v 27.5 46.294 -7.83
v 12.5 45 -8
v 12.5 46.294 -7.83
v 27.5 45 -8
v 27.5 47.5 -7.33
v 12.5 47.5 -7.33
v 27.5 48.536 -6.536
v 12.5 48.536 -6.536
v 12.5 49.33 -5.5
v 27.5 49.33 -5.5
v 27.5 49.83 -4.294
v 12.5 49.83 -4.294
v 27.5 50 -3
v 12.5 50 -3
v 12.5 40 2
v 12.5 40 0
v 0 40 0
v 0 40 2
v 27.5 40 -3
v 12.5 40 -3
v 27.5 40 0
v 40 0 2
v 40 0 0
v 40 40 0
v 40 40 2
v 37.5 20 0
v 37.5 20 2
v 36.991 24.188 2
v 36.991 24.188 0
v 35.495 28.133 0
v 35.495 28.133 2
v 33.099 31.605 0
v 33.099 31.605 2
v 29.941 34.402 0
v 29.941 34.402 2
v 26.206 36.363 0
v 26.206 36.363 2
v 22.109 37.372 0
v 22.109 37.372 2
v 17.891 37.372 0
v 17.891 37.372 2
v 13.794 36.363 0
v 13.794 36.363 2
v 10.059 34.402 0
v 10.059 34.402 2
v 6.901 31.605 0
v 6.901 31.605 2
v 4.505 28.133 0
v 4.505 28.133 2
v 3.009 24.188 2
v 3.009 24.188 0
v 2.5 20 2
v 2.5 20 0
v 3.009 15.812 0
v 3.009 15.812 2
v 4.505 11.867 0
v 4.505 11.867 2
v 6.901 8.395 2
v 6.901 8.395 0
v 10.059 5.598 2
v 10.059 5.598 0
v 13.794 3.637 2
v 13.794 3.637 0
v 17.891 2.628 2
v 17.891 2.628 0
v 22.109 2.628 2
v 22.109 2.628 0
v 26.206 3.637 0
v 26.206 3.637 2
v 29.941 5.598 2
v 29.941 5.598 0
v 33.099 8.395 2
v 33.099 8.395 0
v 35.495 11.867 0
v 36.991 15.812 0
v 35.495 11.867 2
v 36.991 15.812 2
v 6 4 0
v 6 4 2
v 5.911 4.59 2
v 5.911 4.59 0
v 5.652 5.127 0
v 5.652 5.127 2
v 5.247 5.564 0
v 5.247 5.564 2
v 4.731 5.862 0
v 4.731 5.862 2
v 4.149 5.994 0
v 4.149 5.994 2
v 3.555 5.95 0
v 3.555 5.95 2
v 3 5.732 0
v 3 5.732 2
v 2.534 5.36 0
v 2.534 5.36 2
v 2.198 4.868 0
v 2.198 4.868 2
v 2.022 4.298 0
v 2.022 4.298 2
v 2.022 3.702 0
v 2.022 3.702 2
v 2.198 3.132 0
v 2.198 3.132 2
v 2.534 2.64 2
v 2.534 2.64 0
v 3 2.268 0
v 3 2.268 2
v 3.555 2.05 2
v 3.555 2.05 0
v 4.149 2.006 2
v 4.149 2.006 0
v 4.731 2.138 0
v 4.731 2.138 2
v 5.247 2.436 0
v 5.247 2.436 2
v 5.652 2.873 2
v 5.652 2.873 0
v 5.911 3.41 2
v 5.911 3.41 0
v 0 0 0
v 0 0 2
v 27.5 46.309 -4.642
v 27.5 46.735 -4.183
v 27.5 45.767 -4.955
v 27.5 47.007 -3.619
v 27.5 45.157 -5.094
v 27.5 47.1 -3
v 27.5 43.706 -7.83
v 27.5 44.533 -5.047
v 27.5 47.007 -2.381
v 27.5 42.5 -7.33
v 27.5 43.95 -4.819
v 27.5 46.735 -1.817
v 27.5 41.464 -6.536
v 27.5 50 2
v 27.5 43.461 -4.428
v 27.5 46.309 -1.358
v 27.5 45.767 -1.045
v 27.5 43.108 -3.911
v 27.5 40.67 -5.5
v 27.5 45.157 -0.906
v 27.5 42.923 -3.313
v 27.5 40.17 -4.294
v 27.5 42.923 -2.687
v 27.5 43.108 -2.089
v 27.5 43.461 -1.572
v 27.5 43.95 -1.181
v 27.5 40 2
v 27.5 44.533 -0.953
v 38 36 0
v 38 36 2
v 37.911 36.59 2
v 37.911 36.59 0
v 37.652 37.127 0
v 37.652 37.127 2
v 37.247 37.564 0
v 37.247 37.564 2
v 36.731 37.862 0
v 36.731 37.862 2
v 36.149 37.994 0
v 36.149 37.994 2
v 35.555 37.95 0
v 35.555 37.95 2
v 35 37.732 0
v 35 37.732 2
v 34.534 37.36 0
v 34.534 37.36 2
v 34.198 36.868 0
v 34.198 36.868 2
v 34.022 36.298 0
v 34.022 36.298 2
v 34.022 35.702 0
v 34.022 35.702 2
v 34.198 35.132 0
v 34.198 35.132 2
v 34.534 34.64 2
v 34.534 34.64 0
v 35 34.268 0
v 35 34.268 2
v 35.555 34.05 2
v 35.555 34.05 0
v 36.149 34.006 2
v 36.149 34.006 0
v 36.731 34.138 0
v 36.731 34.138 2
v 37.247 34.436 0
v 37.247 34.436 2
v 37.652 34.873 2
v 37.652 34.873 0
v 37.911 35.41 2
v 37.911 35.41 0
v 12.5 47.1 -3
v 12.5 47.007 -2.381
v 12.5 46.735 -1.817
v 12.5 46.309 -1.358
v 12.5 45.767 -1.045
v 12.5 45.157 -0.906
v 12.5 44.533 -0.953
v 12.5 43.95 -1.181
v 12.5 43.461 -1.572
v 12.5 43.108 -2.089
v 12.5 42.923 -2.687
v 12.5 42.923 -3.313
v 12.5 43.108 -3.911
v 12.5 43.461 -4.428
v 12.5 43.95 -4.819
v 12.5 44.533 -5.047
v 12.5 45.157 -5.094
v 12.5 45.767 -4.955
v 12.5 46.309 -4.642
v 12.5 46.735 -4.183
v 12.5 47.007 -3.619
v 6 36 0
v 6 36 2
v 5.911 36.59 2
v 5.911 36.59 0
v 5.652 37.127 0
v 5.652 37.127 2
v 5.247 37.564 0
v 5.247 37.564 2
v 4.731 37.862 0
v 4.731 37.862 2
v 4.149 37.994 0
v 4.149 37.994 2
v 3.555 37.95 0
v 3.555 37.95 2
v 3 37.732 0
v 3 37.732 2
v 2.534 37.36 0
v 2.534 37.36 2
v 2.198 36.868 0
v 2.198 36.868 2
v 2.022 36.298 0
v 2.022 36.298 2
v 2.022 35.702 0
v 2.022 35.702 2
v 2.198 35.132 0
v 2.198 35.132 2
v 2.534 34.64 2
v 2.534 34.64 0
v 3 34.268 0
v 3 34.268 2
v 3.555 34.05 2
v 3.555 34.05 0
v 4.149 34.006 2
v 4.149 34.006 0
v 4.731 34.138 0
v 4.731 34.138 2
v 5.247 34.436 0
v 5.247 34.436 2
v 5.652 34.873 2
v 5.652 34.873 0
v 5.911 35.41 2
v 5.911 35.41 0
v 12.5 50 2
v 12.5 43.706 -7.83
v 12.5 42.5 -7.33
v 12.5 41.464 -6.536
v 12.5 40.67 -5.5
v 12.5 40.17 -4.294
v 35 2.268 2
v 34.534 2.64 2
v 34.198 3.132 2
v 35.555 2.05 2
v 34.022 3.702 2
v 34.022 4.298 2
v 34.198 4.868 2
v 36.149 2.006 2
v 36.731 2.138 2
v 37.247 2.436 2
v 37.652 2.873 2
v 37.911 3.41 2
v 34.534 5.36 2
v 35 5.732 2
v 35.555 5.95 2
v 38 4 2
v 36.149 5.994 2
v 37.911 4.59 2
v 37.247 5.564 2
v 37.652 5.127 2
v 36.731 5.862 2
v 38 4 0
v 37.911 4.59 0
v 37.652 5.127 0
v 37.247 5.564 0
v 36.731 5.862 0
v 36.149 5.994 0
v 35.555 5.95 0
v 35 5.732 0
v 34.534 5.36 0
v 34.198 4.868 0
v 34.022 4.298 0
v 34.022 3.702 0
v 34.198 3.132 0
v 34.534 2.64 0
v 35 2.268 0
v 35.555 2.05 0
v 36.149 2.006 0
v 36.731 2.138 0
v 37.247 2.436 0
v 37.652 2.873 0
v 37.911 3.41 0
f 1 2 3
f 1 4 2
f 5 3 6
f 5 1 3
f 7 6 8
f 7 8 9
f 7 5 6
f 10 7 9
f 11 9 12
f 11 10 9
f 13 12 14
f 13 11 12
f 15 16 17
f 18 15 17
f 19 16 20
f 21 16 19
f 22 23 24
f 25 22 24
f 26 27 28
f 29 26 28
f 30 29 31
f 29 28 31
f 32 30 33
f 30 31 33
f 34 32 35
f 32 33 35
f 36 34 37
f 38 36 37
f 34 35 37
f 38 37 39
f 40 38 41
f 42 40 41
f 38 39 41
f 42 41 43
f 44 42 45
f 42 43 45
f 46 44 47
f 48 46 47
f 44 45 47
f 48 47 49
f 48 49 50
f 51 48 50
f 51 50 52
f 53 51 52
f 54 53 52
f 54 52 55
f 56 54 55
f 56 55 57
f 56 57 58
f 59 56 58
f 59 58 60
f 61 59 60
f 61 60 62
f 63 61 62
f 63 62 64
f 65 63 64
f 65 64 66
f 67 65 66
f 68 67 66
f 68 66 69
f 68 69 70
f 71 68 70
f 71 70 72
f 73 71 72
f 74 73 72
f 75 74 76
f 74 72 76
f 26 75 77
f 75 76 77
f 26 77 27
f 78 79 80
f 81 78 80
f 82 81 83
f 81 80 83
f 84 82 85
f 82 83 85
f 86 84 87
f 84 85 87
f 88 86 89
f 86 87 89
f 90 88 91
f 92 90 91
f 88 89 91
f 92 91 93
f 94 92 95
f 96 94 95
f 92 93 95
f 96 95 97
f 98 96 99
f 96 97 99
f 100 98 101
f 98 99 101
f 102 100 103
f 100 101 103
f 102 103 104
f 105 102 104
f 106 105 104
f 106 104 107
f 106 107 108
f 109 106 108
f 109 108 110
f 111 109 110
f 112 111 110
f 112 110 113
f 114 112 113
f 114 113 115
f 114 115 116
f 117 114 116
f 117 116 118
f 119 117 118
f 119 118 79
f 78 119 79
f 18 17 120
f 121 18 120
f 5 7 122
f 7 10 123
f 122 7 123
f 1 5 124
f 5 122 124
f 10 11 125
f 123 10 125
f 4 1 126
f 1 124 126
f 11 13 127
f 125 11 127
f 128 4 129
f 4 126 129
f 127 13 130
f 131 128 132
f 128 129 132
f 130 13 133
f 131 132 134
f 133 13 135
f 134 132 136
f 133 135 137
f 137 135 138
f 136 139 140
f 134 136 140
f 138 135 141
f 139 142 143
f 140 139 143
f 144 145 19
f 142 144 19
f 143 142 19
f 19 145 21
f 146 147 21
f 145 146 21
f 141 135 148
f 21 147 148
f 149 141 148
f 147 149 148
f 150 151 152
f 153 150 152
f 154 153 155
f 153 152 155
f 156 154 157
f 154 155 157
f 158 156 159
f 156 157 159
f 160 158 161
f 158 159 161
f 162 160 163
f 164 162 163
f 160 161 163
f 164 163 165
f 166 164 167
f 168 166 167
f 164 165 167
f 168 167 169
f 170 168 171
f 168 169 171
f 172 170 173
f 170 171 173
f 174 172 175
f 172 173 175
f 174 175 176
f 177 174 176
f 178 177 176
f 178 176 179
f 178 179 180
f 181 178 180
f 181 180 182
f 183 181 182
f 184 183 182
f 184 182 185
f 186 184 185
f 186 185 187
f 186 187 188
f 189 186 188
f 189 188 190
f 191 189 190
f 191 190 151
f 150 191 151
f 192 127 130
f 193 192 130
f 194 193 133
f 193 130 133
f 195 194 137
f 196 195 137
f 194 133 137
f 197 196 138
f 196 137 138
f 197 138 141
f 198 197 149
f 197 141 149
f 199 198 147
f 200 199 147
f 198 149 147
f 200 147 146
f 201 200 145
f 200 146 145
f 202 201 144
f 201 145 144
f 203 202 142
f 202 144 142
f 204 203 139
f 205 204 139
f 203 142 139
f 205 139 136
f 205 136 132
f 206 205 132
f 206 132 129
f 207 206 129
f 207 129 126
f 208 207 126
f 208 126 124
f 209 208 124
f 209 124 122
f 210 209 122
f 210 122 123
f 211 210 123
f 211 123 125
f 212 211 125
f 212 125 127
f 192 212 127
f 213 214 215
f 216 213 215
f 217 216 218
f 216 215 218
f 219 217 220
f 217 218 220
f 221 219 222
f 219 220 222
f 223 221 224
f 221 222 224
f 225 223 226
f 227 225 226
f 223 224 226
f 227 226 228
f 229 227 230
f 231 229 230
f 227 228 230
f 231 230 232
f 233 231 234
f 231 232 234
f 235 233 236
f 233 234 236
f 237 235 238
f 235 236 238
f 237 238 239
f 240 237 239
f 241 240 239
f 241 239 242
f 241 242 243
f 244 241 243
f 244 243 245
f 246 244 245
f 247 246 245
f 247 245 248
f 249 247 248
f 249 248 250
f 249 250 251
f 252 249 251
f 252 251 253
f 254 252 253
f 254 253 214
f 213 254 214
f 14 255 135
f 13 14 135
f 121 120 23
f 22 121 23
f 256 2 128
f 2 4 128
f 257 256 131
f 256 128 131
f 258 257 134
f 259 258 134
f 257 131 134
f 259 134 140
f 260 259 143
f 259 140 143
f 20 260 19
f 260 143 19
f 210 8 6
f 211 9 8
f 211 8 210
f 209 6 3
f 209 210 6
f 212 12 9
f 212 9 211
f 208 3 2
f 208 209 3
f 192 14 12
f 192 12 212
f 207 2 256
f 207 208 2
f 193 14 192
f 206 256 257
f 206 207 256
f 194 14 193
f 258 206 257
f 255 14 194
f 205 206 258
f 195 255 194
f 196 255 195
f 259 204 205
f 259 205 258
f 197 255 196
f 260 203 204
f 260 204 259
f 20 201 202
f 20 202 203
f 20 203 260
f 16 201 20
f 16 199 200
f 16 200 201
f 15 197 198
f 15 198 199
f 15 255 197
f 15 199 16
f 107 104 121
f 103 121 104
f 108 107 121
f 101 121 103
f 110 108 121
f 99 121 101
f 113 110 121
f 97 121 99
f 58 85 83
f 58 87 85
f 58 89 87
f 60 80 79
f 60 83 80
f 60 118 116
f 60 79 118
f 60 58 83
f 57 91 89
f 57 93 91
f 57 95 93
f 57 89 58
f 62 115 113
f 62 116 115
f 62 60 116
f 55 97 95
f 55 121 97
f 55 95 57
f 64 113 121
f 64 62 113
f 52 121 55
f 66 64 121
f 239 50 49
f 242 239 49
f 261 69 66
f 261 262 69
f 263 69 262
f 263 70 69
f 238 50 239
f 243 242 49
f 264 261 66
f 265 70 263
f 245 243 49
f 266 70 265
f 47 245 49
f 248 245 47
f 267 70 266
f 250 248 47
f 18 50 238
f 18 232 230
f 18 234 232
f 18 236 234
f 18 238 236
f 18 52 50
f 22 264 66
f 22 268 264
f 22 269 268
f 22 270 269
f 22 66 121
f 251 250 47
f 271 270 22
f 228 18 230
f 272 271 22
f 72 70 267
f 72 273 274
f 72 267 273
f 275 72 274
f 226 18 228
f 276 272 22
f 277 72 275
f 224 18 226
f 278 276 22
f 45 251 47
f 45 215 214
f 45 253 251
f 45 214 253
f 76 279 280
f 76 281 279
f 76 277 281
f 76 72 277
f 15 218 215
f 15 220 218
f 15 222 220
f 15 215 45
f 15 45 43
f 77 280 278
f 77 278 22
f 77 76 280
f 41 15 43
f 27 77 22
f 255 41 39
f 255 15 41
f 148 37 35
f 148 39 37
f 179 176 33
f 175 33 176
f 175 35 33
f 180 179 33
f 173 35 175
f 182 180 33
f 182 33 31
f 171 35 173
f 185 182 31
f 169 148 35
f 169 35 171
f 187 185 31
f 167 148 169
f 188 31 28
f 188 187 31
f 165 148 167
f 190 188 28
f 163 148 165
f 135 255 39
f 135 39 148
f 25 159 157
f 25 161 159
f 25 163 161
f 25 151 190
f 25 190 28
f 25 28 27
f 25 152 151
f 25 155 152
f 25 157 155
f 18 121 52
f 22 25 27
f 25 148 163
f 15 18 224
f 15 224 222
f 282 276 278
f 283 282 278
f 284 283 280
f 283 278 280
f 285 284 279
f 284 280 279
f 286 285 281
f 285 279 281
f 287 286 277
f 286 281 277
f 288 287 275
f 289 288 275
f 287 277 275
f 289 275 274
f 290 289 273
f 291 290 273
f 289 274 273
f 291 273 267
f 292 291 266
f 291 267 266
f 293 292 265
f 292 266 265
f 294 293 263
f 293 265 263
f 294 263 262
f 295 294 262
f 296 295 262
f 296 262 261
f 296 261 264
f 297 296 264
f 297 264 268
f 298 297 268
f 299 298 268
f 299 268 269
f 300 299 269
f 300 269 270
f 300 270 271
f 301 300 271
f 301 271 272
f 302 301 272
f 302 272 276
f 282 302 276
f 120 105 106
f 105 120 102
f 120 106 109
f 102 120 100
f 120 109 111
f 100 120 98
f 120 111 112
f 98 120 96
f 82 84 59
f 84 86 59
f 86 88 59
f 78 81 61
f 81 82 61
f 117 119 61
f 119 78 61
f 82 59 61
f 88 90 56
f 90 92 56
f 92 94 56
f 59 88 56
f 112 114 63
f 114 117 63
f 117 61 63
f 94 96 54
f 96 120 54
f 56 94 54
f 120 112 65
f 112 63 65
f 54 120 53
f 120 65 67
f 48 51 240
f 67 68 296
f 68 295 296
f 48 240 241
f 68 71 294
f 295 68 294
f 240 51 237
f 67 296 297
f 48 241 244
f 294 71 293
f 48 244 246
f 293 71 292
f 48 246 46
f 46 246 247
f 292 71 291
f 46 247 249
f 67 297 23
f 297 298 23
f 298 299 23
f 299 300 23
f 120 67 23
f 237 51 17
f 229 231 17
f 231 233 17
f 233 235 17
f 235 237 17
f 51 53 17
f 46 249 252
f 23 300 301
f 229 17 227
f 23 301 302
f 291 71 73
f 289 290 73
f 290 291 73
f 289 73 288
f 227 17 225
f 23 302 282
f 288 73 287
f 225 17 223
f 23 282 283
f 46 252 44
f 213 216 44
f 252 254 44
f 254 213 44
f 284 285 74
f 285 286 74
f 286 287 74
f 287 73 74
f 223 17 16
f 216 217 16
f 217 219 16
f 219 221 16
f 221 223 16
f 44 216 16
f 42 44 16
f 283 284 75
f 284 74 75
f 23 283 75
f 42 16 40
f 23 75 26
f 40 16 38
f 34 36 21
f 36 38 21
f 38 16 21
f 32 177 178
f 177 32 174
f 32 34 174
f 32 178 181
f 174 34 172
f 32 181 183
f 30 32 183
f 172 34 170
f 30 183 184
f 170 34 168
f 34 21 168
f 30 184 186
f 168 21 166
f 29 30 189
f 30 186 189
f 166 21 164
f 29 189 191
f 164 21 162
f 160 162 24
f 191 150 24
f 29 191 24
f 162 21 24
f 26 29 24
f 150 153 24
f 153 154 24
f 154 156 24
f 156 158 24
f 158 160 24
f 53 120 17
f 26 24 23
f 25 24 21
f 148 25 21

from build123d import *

# Parameters (mm, degrees)
F0_W     = 15
F0_H     = 10
F1_DEPTH = 2
F2_R     = 2
F3_DEPTH = 2.001
F4_R     = 17.5
F5_DEPTH = 2.001
F6_W     = 15
F6_H     = 10
F7_DEPTH = 8
F8_R     = 2.1
F9_DEPTH = 27.501
F10_R    = 4.99999


# Not quite as in the source:
# - a fillet or chamfer is up to 0.001 mm smaller than in the source, because OpenCascade refuses the exact size


with BuildPart() as f1:
    # F0 (on Top) → F1 (new body)
    with BuildSketch(Plane.XY):
        Polygon((0, 40), (0, 0), (40, 0), (40, 40), (27.5, 40), (12.5, 40), align=None)
        with Locations((20, 45)):
            Rectangle(F0_W, F0_H)
    extrude(amount=F1_DEPTH)

    # F2 (on face) → F3 (cut, through all)
    with BuildSketch(Plane.XY.offset(2)):
        with Locations((4, 36)):
            Circle(F2_R)
        with Locations((36, 36)):
            Circle(F2_R)
        with Locations((4, 4)):
            Circle(F2_R)
        with Locations((36, 4)):
            Circle(F2_R)
    extrude(amount=-F3_DEPTH, mode=Mode.SUBTRACT)

    # F4 (on face) → F5 (cut, through all)
    with BuildSketch(Plane.XY.offset(2)):
        with Locations((20, 20)):
            Circle(F4_R)
    extrude(amount=-F5_DEPTH, mode=Mode.SUBTRACT)

    # F6 (on face) → F7 (join)
    with BuildSketch(Plane(origin=(0, 0, 0), x_dir=(1, 0, 0), z_dir=(0, 0, -1))):
        with Locations((20, -45)):
            Rectangle(F6_W, F6_H)
    extrude(amount=F7_DEPTH)

    # F8 (on face) → F9 (cut, through all)
    with BuildSketch(Plane.YZ.offset(27.5)):
        with Locations((45, -3)):
            Circle(F8_R)
    extrude(amount=-F9_DEPTH, mode=Mode.SUBTRACT)

    # F10 (radius 5 in the source; OpenCascade refuses exactly that, so slightly less here)
    f10_edges = [f1.edges().sort_by_distance(p)[0] for p in [
        (20, 50, -8),
        (20, 40, -8),
    ]]
    fillet(f10_edges, radius=F10_R)


solid = f1.part
